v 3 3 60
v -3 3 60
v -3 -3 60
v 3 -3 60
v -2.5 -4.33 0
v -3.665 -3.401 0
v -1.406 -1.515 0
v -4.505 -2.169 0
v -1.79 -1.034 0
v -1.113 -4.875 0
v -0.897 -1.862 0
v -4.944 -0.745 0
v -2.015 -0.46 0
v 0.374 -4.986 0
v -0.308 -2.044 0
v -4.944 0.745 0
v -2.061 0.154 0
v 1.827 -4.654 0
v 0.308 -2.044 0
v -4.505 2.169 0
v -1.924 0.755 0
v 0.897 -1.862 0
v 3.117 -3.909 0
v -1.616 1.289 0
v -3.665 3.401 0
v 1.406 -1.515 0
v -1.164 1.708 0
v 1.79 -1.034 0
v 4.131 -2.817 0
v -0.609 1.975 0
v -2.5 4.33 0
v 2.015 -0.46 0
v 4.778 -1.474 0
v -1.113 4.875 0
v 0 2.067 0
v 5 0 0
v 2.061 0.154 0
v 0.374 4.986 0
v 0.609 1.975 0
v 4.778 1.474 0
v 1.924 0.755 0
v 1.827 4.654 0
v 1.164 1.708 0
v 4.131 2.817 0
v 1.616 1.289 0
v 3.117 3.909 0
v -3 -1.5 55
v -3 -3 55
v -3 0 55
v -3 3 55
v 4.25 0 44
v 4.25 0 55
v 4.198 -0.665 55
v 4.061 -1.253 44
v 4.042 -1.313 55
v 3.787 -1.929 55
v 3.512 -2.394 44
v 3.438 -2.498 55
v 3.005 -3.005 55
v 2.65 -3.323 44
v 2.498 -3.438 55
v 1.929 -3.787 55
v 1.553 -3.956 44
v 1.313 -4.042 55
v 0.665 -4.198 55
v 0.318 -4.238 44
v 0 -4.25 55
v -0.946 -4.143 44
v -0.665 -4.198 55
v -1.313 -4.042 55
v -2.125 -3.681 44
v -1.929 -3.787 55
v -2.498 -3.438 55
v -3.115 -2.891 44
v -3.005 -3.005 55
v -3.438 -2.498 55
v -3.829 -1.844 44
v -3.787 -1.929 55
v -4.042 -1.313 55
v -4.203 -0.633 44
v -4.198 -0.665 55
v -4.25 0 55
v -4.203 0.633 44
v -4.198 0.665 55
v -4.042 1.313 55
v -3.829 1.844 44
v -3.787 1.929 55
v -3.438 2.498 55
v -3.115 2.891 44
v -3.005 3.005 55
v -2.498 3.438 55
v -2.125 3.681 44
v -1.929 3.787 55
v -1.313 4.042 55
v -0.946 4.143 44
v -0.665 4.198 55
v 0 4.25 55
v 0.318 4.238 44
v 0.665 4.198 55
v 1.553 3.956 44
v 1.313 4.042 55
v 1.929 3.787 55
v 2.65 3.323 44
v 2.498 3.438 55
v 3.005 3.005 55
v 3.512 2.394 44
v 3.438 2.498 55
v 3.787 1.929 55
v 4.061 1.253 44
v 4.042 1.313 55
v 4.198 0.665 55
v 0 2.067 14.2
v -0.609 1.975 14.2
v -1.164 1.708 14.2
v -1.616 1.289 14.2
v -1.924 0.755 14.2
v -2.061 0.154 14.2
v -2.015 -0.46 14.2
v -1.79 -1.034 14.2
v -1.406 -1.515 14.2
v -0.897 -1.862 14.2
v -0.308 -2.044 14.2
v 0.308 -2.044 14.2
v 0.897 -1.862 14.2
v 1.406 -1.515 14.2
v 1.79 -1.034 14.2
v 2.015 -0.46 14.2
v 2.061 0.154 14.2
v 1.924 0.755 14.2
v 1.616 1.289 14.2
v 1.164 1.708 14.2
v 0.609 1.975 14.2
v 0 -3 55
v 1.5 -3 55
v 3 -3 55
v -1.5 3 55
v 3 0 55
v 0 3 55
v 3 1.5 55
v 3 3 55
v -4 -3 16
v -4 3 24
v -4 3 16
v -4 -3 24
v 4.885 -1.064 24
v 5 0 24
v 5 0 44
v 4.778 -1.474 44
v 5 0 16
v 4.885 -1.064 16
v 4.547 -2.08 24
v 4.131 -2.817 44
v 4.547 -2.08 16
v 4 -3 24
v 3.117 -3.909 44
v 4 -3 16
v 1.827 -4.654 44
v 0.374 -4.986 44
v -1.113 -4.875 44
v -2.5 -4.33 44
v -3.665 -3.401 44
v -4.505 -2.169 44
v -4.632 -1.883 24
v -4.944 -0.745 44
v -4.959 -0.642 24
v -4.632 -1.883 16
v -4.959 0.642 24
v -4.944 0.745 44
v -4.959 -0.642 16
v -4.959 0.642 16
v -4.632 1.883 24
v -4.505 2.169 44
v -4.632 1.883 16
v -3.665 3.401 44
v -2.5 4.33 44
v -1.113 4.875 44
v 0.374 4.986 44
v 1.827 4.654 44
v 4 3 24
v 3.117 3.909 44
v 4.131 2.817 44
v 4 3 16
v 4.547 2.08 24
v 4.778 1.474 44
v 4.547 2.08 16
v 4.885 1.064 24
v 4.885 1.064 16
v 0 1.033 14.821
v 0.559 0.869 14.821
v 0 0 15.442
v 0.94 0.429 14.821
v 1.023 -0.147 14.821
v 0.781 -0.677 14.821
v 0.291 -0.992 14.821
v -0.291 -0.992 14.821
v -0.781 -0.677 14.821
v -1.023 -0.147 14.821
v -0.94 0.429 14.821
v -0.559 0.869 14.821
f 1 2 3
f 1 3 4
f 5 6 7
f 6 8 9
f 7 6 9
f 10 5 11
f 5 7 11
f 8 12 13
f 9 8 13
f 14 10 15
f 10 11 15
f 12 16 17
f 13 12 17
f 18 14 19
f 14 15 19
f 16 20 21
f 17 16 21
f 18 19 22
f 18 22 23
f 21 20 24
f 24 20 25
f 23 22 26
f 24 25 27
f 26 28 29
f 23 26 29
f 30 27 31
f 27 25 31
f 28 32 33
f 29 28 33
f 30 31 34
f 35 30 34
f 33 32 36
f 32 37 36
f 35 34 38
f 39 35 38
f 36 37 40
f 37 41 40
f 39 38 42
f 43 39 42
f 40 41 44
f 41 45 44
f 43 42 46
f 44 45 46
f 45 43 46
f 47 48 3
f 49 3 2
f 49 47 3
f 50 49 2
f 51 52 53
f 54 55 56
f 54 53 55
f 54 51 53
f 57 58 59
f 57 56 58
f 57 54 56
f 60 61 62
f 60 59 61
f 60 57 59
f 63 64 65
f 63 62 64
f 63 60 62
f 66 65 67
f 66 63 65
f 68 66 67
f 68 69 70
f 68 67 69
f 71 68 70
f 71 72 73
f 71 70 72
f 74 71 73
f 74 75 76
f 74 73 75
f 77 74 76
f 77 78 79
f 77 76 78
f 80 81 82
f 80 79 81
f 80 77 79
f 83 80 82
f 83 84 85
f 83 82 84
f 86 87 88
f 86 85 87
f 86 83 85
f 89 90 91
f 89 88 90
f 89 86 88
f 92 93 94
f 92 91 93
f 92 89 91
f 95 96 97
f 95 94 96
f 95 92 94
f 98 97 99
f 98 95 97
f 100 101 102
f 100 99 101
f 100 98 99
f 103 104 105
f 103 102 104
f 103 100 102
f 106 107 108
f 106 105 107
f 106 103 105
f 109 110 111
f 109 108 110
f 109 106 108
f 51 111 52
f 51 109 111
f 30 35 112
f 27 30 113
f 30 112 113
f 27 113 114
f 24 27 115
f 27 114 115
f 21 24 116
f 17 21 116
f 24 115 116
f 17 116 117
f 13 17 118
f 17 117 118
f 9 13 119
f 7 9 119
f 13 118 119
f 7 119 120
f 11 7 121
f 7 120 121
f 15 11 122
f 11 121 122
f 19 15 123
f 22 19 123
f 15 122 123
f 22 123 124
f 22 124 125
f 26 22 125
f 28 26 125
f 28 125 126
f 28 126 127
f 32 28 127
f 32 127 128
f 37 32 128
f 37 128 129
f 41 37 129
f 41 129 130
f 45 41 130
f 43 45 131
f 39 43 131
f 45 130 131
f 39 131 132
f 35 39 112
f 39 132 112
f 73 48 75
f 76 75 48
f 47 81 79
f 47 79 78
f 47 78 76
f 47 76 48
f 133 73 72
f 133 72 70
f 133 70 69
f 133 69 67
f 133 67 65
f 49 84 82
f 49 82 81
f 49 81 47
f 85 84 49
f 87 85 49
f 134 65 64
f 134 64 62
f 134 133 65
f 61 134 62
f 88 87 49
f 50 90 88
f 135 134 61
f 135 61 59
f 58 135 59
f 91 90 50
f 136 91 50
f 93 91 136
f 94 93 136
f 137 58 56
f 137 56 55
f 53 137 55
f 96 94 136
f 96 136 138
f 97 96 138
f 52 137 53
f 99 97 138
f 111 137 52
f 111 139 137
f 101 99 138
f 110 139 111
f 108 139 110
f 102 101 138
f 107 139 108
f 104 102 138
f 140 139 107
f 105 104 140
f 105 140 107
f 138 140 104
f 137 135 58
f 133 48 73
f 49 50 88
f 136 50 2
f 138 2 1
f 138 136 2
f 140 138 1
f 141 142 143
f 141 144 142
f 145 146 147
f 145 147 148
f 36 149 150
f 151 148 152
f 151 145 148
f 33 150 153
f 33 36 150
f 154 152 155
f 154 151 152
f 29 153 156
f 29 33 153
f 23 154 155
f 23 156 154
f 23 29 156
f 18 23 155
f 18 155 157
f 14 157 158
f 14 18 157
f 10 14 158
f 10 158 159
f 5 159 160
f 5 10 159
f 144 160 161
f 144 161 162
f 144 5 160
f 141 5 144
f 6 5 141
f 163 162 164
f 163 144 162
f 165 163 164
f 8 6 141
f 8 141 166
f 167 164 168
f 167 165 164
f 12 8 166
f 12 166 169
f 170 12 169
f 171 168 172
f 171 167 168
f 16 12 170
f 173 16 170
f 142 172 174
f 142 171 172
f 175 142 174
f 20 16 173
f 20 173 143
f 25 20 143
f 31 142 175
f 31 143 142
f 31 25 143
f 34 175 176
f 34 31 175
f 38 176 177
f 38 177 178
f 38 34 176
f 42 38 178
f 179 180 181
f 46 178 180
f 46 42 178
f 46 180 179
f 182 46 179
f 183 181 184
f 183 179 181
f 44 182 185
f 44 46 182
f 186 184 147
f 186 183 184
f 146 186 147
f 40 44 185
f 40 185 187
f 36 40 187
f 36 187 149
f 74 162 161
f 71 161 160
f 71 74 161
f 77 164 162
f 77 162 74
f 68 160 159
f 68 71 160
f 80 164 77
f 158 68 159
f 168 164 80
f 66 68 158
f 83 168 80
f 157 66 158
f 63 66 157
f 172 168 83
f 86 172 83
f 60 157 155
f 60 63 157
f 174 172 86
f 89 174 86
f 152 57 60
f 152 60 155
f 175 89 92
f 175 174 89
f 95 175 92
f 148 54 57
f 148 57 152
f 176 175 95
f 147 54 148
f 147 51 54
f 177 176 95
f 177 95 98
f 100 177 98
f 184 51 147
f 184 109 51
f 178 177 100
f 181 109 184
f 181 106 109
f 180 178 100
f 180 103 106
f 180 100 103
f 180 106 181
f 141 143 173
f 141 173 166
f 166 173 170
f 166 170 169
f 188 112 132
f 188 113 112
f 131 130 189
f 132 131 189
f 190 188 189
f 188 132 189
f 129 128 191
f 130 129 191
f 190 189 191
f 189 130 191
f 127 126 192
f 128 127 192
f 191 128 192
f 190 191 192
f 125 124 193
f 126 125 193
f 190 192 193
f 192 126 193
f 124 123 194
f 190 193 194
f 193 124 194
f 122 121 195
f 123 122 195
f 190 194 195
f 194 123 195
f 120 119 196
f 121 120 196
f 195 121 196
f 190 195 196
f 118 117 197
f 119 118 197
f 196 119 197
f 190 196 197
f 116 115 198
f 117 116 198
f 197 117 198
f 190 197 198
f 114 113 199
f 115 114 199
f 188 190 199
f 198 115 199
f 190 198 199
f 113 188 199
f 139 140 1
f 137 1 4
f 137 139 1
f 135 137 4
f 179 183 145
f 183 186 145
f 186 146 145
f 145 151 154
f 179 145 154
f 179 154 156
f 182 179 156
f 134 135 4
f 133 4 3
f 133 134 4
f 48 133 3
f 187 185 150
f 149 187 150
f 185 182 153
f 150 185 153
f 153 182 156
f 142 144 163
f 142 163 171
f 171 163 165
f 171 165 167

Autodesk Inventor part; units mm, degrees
ref_plane "YZ Plane" through (0, 0, 0) normal (1, 0, 0) x (0, 1, 0)
ref_plane "XZ Plane" through (0, 0, 0) normal (0, 1, 0) x (-1, 0, 0)
ref_plane "XY Plane" through (0, 0, 0) normal (0, 0, 1) x (1, 0, 0)
sketch "Skizze1" plane through (0, 0, 0) normal (0, 0, 1) x (1, 0, 0)
  line L0 (-7, 0) -> (7, 0) projected
  line L1 (0, -7) -> (0, 7) projected
  circle A0 centre (0, 0) radius 5
  dimension "d0" = 10
extrude "Extrusion1" add sketch "Skizze1" along normal blind 44
sketch "Skizze2" plane through (0, 0, 44) normal (0, 0, 1) x (1, 0, 0)
  circle A0 centre (0, 0) radius 5 projected
  circle A1 centre (0, 0) radius 4.25
  dimension "d3" = 8.5
extrude "Extrusion2" add sketch "Skizze2" along normal blind 11 contours A1
sketch "Skizze3" plane through (0, 0, 0) normal (0, 0, -1) x (-1, 0, 0)
  circle A0 centre (0, 0) radius 5 projected
hole "Bohrung1" at (0, 0, 0) direction (0, 0, 1) diameter 4.134 depth 14.2 tip angle 118 thread size "M5x0.8" class "6H" standard "ISO Metric profile"
sketch "Skizze4" plane through (0, 0, 55) normal (0, 0, 1) x (1, 0, 0)
  line L0 (3, -3) -> (-3, -3)
  line L1 (-3, -3) -> (-3, 3)
  line L2 (-3, 3) -> (3, 3)
  line L3 (3, 3) -> (3, -3)
  circle A0 centre (0, 0) radius 4.25 projected
  line L4 (3, -3) -> (-3, 3) construction
  line L5 (-3, -3) -> (3, 3) construction
  dimension "d13" = 6
  dimension "d14" = 6
extrude "Extrusion3" add sketch "Skizze4" along normal blind 5 contours L0 L1 L2 L3
sketch "Skizze5" plane through (0, 0, 0) normal (0, 1, 0) x (-1, 0, 0)
  line L0 (0, -12.3) -> (0, 73.8) projected
  line L1 (7, 0) -> (-7, 0) projected
  line L2 (8.228, 20) -> (-9.772, 20)
  line L3 (5, 44) -> (-5, 44) projected
  line L4 (5, 0) -> (-5, 0) projected
  line L5 (5, 0) -> (5, 44) projected
  line L6 (-5, 0) -> (-5, 44) projected
  line L7 (4, 16) -> (5, 16)
  line L8 (5, 16) -> (5, 24)
  line L9 (5, 24) -> (4, 24)
  line L10 (4, 24) -> (4, 16)
  line L11 (4, 16) -> (5, 24) construction
  line L12 (5, 16) -> (4, 24) construction
  line L13 (-4, 16) -> (-5, 16)
  line L14 (-5, 16) -> (-5, 24)
  line L15 (-5, 24) -> (-4, 24)
  line L16 (-4, 24) -> (-4, 16)
  line L17 (-4, 16) -> (-5, 24) construction
  line L18 (-5, 16) -> (-4, 24) construction
  point P0 (0, 0)
  point P1 (4.5, 20)
  point P2 (-4.5, 20)
  dimension "d17" = 8
  dimension "d18" = 8
  dimension "d19" = 20
extrude "Extrusion4" cut sketch "Skizze5" along normal mid plane 44 contours L10 L9 L5 L2 | L2 L5 L7 L10 | L16 L13 L6 L2 | L2 L6 L15 L16
equation "\"d13\" = d14"
properties part number "24_0497_009"
